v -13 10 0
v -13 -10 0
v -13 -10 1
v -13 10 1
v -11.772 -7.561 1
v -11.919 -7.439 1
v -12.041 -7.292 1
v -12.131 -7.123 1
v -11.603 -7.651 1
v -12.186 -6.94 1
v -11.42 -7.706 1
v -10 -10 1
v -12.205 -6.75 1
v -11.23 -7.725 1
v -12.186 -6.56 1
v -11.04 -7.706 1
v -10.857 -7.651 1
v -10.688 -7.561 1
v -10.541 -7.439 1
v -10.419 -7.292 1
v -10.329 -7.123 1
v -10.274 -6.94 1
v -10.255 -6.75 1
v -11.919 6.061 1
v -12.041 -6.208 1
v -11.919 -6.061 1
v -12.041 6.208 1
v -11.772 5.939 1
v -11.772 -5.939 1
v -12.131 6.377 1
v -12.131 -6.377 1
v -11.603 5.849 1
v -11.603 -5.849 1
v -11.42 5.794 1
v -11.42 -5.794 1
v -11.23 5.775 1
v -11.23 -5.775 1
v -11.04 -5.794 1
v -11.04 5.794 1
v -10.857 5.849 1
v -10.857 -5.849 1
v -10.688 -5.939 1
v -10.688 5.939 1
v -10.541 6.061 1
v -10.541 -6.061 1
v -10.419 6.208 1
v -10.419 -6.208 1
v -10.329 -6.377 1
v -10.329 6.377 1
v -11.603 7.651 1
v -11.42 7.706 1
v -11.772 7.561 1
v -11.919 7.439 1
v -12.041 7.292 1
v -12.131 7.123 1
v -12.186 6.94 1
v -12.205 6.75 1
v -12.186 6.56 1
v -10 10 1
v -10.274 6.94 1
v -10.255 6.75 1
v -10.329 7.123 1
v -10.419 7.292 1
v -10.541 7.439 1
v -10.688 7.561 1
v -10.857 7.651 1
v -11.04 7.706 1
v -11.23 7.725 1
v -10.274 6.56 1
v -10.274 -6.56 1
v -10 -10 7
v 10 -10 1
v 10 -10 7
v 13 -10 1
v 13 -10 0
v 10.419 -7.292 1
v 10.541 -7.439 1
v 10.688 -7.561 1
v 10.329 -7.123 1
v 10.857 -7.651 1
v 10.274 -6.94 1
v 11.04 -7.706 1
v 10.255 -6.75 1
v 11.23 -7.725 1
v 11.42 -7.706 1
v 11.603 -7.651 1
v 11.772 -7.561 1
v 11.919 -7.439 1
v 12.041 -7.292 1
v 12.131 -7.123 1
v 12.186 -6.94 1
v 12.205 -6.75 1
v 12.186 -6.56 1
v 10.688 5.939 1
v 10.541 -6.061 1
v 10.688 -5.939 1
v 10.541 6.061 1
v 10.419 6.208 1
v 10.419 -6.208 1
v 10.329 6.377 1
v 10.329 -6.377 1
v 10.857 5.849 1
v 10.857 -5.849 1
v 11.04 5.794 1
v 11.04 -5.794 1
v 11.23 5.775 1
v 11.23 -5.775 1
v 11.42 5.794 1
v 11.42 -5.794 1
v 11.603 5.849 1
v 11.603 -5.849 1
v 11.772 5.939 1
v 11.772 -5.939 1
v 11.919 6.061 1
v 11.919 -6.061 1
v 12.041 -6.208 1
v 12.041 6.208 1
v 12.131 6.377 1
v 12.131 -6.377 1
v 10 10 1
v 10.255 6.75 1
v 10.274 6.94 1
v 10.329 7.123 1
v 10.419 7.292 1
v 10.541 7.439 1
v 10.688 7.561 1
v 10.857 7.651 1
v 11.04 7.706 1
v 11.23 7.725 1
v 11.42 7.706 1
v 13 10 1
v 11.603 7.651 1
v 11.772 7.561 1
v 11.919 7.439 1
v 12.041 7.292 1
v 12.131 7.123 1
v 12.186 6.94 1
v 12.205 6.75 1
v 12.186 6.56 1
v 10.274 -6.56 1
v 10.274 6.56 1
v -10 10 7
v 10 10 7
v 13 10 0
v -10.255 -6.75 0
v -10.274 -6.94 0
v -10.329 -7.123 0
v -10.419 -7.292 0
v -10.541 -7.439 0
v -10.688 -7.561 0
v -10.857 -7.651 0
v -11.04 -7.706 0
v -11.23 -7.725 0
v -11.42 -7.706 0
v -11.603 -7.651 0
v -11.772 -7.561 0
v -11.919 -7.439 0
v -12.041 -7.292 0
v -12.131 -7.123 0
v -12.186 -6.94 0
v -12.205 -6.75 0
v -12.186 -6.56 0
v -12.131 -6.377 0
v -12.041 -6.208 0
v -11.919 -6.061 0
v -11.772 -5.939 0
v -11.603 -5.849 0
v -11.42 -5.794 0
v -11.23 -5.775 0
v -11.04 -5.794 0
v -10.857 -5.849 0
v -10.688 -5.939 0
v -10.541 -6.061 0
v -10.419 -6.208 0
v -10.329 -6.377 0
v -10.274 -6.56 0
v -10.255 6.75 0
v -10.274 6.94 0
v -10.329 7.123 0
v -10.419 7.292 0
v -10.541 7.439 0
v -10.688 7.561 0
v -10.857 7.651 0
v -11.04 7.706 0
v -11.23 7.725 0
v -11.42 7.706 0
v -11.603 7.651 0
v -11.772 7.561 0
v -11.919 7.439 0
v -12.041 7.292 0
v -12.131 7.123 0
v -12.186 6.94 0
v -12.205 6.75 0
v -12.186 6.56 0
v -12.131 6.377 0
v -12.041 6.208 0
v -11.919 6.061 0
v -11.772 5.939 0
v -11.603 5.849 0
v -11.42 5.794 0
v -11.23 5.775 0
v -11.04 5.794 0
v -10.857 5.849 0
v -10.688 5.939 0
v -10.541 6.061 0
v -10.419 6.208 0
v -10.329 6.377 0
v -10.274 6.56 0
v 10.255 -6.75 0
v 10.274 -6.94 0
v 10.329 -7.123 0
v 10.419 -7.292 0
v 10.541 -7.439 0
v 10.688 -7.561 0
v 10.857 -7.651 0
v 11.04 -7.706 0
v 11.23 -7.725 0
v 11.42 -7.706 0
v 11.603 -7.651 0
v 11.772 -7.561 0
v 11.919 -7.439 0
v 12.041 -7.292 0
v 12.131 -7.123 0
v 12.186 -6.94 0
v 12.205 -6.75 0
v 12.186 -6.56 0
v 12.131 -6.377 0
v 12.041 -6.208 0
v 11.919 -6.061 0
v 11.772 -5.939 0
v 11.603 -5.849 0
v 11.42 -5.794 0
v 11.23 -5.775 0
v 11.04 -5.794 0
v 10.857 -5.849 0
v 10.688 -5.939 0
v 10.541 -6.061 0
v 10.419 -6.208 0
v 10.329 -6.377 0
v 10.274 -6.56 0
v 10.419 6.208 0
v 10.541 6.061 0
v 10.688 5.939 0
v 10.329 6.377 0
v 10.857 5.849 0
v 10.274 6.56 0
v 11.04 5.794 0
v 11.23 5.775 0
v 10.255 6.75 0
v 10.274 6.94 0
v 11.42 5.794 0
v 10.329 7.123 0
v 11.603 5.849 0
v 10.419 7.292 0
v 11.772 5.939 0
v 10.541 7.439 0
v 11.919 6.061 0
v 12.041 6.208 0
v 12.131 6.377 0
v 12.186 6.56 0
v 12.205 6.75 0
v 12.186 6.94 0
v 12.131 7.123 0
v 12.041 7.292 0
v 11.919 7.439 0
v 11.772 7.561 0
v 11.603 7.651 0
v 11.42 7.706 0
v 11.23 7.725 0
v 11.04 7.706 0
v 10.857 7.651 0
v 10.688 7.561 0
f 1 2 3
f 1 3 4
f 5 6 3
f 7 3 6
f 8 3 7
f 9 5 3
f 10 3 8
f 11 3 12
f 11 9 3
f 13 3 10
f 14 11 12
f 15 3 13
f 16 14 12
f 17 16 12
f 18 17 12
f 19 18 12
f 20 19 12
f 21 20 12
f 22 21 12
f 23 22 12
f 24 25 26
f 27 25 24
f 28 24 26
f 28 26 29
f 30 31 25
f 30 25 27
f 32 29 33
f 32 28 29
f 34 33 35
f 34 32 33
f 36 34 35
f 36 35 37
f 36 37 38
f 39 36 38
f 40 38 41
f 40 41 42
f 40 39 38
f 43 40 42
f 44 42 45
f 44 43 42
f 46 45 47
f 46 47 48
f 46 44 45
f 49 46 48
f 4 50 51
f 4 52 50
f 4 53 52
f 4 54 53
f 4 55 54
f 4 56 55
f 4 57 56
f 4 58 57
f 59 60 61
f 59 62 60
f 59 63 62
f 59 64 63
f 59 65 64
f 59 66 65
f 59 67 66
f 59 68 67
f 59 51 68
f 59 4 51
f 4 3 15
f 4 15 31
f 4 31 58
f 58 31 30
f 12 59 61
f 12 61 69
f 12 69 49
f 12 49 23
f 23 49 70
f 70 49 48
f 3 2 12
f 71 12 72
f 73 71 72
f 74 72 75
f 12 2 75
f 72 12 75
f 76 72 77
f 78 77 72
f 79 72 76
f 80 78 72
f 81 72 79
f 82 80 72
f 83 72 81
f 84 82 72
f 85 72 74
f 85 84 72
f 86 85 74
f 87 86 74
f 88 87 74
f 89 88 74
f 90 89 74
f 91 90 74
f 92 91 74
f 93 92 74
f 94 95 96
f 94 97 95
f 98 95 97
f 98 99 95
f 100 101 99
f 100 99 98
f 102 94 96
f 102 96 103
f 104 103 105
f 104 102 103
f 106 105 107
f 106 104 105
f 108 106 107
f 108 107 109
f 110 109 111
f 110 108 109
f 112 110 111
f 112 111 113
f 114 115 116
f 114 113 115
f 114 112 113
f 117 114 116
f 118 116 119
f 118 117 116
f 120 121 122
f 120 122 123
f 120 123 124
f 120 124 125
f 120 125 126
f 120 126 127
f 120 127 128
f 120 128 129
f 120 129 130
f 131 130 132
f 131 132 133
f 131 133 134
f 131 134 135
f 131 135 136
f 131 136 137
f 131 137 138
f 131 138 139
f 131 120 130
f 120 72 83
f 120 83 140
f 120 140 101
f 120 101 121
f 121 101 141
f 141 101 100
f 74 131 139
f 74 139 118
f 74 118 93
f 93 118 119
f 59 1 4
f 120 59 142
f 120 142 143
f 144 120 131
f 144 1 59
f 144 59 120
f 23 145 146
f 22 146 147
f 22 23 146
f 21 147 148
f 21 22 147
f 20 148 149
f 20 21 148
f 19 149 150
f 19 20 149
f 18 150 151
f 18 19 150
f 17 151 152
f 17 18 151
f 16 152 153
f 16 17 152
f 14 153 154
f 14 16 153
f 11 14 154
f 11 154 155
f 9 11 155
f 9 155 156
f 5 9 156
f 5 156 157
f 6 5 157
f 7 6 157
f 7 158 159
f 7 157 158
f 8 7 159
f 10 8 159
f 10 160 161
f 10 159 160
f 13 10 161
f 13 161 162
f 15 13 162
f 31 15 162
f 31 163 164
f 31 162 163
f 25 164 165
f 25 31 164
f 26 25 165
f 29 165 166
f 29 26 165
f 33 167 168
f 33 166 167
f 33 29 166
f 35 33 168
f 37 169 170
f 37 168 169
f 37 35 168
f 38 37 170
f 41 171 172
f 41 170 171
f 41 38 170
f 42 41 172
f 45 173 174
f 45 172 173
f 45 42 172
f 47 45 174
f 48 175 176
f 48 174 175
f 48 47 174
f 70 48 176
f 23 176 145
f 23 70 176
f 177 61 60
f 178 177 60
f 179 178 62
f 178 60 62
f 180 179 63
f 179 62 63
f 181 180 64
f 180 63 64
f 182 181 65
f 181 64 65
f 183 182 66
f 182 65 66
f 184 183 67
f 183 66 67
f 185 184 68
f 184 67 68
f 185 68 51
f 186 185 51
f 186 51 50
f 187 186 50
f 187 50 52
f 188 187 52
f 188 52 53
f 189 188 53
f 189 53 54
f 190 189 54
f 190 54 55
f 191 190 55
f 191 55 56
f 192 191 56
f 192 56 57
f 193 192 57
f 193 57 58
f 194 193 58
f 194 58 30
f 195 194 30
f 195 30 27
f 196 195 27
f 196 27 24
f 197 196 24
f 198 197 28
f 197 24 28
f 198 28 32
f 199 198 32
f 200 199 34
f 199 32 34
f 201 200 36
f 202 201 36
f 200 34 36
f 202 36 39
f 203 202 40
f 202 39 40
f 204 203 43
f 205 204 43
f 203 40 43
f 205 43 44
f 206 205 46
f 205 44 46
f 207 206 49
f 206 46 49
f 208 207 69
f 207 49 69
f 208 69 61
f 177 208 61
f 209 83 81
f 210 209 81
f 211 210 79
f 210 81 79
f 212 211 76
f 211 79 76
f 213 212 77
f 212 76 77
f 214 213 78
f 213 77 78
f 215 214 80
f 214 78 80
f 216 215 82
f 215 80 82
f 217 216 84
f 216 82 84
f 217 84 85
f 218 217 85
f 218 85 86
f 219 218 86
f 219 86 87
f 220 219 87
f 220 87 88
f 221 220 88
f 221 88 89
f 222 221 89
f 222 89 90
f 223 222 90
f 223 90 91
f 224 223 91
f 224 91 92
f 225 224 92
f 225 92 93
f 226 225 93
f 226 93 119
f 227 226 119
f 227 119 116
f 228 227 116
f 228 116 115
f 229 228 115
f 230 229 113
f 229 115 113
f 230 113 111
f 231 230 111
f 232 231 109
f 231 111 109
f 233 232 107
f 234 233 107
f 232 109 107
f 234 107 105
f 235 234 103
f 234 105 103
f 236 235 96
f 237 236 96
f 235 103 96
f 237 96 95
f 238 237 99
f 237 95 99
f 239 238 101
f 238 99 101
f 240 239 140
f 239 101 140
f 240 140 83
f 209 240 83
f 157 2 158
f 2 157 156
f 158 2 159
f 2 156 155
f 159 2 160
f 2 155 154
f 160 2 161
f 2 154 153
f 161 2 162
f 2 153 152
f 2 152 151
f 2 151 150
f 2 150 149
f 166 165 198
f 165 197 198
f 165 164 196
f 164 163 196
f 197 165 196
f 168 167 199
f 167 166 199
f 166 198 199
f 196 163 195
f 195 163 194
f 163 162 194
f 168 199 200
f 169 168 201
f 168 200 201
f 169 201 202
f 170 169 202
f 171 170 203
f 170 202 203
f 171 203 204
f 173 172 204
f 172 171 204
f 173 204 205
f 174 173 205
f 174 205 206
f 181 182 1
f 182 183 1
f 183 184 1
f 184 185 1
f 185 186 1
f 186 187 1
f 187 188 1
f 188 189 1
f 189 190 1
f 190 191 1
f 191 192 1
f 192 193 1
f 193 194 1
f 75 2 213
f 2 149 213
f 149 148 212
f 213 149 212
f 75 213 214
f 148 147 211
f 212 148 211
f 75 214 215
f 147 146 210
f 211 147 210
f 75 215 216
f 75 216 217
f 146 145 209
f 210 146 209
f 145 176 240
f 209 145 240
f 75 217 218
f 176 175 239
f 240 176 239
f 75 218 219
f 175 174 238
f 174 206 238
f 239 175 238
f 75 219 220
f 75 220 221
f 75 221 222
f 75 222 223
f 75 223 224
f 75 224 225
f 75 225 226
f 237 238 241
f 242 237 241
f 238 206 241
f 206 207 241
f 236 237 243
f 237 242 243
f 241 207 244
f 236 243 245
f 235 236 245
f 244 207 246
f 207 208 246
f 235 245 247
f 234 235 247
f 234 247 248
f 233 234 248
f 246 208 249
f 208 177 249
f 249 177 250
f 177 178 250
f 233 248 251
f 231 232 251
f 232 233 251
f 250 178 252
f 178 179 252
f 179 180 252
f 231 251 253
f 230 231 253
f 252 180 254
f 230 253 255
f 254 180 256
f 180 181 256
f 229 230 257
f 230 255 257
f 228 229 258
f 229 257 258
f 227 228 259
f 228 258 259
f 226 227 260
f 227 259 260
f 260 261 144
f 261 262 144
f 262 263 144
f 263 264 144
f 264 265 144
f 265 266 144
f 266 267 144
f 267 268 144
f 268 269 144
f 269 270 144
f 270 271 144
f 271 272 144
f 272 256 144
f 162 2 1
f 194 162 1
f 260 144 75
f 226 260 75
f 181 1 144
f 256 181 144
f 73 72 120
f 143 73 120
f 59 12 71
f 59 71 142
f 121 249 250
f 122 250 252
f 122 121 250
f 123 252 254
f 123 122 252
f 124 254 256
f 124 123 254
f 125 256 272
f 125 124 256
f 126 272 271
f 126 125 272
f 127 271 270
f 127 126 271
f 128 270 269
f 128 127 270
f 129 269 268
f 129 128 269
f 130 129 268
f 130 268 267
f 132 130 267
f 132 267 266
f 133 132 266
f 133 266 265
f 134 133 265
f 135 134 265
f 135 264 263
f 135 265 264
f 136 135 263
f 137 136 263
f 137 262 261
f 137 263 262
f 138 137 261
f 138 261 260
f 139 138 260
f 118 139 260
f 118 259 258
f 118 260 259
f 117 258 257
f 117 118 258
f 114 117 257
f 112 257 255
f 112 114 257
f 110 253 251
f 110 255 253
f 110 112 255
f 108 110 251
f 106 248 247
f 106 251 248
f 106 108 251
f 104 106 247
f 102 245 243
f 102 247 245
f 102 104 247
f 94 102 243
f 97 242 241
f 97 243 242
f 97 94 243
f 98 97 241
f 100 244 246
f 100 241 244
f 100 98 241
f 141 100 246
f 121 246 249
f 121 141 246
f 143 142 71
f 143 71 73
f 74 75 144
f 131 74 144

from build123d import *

# Parameters (mm, degrees)
SKETCH2_W               = 26
SKETCH2_H               = 20
BOSS_EXTRUDE1_DEPTH     = 1
SKETCH3_W               = 20
SKETCH3_H               = 20
BOSS_EXTRUDE2_DEPTH     = 6
SKETCH4_R               = 0.975
CUT_EXTRUDE1_DEPTH      = 2
MIRROR2_COPY_1_SKETCH_R = 0.975
MIRROR2_COPY_1_DEPTH    = 2


with BuildPart() as part:
    # Sketch2 → Boss-Extrude1 (new body)
    with BuildSketch(Plane.XY):
        Rectangle(SKETCH2_W, SKETCH2_H)
    extrude(amount=BOSS_EXTRUDE1_DEPTH)

    # Sketch3 → Boss-Extrude2 (add)
    with BuildSketch(Plane.XY.offset(1)):
        Rectangle(SKETCH3_W, SKETCH3_H)
    extrude(amount=BOSS_EXTRUDE2_DEPTH)

    # Sketch4 → Cut-Extrude1 (cut, through all)
    with BuildSketch(Plane.XY.offset(1)):
        with Locations((-11.23, 6.75)):
            Circle(SKETCH4_R)
    cut_extrude1 = extrude(amount=-CUT_EXTRUDE1_DEPTH, mode=Mode.SUBTRACT)

    # Mirror1: Cut-Extrude1 across plane
    add(cut_extrude1.mirror(Plane(origin=(0, 0, 0), x_dir=(0, 0, 1), z_dir=(1, 0, 0))), mode=Mode.SUBTRACT)

    # Mirror2: Cut-Extrude1 across plane
    add(cut_extrude1.mirror(Plane.ZX), mode=Mode.SUBTRACT)

    # Mirror2 copy 1 sketch → Mirror2 copy 1 (cut, through all)
    with BuildSketch(Plane(origin=(0, 0, 1), x_dir=(-1, 0, 0), z_dir=(0, 0, 1))):
        with Locations((-11.23, 6.75)):
            Circle(MIRROR2_COPY_1_SKETCH_R)
    extrude(amount=-MIRROR2_COPY_1_DEPTH, mode=Mode.SUBTRACT)


solid = part.part
